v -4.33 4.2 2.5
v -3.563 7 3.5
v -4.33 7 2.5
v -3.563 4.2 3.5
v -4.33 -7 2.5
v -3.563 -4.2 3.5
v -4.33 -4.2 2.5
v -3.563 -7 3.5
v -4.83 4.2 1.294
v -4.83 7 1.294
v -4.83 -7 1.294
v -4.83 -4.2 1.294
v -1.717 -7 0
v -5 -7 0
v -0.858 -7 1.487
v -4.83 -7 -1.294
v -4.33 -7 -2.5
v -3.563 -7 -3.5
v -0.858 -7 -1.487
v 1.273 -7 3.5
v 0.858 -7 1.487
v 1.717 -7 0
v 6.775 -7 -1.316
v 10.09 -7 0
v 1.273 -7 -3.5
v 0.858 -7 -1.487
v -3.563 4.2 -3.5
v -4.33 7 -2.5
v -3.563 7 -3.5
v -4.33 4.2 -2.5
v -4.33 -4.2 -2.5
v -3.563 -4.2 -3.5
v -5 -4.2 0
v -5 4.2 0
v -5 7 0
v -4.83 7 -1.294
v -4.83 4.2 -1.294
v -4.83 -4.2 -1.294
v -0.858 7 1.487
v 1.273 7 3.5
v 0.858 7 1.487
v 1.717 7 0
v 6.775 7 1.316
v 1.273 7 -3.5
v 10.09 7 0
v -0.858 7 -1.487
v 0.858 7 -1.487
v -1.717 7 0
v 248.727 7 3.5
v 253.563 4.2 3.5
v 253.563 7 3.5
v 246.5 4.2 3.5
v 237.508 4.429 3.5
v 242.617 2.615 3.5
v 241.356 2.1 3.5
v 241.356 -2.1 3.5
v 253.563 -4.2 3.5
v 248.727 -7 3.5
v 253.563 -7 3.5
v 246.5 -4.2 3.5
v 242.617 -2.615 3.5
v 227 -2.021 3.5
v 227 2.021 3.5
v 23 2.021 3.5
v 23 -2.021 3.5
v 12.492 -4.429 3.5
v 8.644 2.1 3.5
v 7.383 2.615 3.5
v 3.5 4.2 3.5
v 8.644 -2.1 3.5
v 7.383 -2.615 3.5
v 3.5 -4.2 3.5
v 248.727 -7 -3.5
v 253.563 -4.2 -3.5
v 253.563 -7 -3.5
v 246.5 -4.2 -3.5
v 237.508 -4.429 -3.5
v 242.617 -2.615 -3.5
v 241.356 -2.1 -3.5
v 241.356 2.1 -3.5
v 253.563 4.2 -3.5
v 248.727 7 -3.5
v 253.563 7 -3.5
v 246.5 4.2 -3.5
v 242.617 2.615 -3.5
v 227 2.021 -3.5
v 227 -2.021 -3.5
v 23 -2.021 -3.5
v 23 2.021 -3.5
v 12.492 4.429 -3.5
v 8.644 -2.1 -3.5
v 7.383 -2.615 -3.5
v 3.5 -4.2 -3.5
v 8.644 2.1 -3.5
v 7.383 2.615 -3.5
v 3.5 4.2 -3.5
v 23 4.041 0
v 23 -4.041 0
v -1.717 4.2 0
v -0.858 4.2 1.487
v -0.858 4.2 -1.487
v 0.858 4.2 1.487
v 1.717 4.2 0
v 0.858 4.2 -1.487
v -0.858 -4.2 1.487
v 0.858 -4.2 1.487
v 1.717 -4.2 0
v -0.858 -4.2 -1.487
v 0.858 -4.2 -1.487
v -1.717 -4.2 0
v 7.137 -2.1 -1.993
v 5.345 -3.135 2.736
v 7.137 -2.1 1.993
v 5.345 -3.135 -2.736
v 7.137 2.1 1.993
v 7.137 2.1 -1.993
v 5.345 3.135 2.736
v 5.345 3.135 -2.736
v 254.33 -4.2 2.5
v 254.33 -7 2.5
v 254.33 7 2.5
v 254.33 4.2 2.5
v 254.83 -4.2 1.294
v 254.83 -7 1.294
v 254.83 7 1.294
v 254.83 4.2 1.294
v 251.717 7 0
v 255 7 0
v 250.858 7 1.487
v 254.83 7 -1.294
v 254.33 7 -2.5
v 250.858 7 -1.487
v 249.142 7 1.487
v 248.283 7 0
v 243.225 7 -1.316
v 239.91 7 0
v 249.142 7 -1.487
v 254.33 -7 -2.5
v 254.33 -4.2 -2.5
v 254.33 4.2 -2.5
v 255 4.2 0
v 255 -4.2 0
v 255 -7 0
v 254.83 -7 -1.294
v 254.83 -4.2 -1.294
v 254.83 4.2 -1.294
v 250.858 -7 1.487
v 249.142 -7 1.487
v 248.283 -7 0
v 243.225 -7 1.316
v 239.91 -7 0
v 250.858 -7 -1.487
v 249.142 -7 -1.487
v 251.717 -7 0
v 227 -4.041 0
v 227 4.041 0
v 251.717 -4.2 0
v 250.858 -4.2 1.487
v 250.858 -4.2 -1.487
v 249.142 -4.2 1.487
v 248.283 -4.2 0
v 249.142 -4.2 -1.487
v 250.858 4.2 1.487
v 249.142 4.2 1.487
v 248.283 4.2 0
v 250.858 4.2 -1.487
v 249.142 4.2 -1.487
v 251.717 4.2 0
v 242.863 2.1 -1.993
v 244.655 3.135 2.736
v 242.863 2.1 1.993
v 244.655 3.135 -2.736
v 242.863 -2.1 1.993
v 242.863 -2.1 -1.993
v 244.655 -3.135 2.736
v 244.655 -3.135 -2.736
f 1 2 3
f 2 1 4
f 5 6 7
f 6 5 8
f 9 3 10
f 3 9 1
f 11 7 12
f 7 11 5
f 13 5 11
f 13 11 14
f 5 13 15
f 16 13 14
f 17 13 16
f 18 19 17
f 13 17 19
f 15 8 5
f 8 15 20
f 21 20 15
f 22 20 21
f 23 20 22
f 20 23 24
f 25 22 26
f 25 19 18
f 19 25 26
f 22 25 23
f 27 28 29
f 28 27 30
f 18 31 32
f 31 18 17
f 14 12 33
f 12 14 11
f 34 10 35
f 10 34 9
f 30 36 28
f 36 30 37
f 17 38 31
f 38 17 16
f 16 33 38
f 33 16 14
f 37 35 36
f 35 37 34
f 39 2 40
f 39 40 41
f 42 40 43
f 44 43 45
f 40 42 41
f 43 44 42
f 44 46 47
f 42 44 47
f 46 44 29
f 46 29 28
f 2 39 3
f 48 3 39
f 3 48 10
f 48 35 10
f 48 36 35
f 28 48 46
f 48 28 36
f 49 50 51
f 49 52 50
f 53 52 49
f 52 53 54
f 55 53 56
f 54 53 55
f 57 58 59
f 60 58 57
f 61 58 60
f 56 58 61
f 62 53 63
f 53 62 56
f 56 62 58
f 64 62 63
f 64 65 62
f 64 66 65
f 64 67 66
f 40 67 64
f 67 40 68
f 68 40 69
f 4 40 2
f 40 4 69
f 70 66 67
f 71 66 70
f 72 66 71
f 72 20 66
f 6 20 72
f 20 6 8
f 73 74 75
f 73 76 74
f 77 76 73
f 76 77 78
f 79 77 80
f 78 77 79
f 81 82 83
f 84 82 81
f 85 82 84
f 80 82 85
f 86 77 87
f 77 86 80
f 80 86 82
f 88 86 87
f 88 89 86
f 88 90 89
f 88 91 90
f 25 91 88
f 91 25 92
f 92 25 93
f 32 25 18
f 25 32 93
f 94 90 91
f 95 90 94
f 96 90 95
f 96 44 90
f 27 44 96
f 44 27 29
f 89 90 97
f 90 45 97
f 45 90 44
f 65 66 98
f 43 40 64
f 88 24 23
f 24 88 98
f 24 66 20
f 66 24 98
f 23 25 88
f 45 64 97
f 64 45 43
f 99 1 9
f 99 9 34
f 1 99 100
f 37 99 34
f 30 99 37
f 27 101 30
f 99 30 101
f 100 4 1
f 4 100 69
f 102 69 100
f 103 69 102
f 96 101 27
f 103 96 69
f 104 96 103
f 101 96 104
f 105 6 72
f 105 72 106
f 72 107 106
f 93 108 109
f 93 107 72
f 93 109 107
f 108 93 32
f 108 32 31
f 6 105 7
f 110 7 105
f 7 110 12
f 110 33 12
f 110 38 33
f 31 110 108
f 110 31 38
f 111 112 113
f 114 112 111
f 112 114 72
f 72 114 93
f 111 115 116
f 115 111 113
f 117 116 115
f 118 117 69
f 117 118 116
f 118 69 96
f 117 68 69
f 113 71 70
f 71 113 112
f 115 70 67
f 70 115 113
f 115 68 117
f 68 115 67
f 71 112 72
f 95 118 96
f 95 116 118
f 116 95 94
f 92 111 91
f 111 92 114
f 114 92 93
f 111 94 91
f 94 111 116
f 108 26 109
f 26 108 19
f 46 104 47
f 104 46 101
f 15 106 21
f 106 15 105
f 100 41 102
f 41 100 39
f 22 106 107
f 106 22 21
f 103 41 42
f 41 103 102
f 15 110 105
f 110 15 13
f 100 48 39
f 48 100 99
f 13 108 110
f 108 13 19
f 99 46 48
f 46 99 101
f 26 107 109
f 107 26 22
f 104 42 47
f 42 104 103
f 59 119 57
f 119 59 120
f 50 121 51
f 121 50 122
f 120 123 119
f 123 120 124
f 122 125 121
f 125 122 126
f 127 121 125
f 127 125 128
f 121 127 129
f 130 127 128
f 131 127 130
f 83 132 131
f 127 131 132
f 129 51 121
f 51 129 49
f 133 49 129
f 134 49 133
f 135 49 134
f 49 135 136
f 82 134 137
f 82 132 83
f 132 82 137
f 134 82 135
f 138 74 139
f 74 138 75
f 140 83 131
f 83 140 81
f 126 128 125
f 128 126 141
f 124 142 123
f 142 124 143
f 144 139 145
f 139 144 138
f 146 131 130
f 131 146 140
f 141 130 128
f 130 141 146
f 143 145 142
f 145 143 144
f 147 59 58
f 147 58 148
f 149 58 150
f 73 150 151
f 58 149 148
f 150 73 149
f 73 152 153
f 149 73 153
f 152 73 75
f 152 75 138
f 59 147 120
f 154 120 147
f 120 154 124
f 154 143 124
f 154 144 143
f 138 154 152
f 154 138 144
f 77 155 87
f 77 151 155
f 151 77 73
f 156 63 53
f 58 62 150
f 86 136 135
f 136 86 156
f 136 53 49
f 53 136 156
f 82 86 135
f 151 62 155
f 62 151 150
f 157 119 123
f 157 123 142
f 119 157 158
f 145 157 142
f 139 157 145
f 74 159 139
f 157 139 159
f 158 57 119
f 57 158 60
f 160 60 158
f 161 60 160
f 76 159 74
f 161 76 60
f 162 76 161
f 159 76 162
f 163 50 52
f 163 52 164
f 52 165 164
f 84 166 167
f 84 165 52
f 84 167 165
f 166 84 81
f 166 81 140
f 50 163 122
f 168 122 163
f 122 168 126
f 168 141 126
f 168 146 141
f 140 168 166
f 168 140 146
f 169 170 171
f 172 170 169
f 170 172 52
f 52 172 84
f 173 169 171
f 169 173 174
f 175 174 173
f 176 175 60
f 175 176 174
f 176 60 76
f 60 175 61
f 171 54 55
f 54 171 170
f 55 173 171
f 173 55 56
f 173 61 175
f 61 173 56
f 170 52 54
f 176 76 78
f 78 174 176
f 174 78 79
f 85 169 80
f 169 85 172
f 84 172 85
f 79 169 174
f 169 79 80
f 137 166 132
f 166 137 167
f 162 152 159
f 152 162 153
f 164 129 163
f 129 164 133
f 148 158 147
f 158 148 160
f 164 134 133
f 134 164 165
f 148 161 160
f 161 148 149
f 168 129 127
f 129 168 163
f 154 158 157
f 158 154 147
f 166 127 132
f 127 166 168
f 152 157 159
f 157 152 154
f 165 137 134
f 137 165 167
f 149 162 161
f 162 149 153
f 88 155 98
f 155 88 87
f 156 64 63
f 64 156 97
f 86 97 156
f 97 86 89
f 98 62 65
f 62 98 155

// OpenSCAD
// file: polyholes.scad
//
// Mendel90
//
// GNU GPL v2
// nop.head@gmail.com
// hydraraptor.blogspot.com
//
// See http://hydraraptor.blogspot.com/2011/02/polyholes.html
//
function sides(r) = max(round(4 *r),3);
function corrected_radius(r,n) = 0.1 + r / cos(180 / n);
function corrected_diameter(d) = 0.2 + d / cos(180 / sides(d / 2));

module poly_circle(r, center = false) {
    n = sides(r);
    circle(r = corrected_radius(r,n), $fn = n, center = center);
}

module poly_cylinder(r, h, center = false) {
    n = sides(r);
    cylinder(h = h, r = corrected_radius(r,n), $fn = n, center = center);
}

module poly_d_cylinder(r, center = false) {
    n = sides(r);
    r = corrected_radius(r,n);
    cylinder(h = h, r = r, $fn = n, center = center);
    translate([0, -r, 0])
        cube([r, 2 * r, h]);
}
// file: jaws.scad
use <polyholes.scad>
h = 7;
r = h/2 / cos(30);

module jaws() {
  difference() {
    union() {
      intersection () {
        rotate([90, 0, 0]) cylinder(r=5, h=14, center=true, $fn=24);
        translate([-4, 0, 0]) cube([10, 14, h], center=true);
      }
      intersection() {
        translate([10, 0, 0]) cube([26, 14, h], center=true);
        translate([10, 0, 0]) rotate([0, 90, 0]) rotate([0, 0, 30])
          cylinder(r1=10, r2=r, h=26, center=true, $fn=6);
      }
    }
    translate([-1.5, 0, 0]) cube([10, 8.4, 10], center=true);
    translate([3.5, 0, 0]) rotate([0, 0, 30])
      cylinder(r=4.2, h=10, center=true, $fn=6);
    translate([4, 0, 4]) rotate([0, 45, 0])
      rotate([0, 0, 30]) cylinder(r=4.2, h=8, center=true, $fn=6);
    translate([4, 0, -4]) rotate([0, -45, 0])
      rotate([0, 0, 30]) cylinder(r=4.2, h=8, center=true, $fn=6);
    rotate([90, 0, 0]) poly_cylinder(r=1.4, h=40, center=true, $fn=12);
    translate([19, 0, 0]) rotate([0, 90, 0])
      cylinder(r=2.8, h=20, center=true, $fn=12);
  }
}

translate([0, 0, h/2]) jaws();
// file: configuration.scad
// Bearing dimensions: ID, OD, W
bearing623 = [3, 10, 4];
bearing624 = [4, 13, 5];
bearing608 = [8, 22, 7];
bearinglm8uu = [8, 15, 25];
bearinglm10uu = [10, 19, 29];

smooth_rod_separation = 60;
//smooth_rod_length = 300; // Rostock mini
//smooth_rod_radius = 4;
//smooth_rod_bearing = bearinglm8uu;
smooth_rod_length = 770;
smooth_rod_radius = 5;
smooth_rod_bearing = bearinglm10uu;

motor_end_height = 44;

idler_end_height = 28;
//idler_bearing = bearing608;  // For 20 tooth GT2
idler_bearing = bearing624;  // For 16 thooth GT2

platform_thickness = 8;
platform_hinge_offset = 33;

bed_thickness = 12;
pcb_thickness = 2;

rod_separation = 50;
//rod_length = 150; // Rostock mini
//rod_radius = 65; // Rostock mini
rod_length = 250;
rod_radius = 124;

// These are needed by modules in a couple of different files
carriage_height = smooth_rod_bearing[2];
carriage_hinge_offset = smooth_rod_bearing[1]/2+14.5;

bottom_endstops = false; // If true, adds extra mount points to the platform
ball_joints = true;
ball_rad = 9.5 / 2 + 0.2; // Add a little extra radius for glue
cup_rad = ball_rad + 1;
cup_offset = cup_rad-platform_thickness/2;
// main file
include <configuration.scad>
use <jaws.scad>

l = rod_length;
h = 7;
r = h/2 / cos(30);

// Wipe nozzle after long travel moves.
module collar() {
  difference() {
    cube([4, 20, h], center=true);
    cube([2, 18, h+1], center=true);
    rotate([0, 90, 0]) rotate([0, 0, 30])
      cylinder(r=5, h=5, center=true, $fn=6);
  }
}

// Small hollow cube.
module cubicle() {
  difference() {
    cube([6, 6, h], center=true);
    cube([4, 4, h+1], center=true);
  }
}

// Nozzle wipers.
module wipers() {
  translate([l/2+2, 0, 0]) cubicle();
  translate([-l/2-2, 0, 0]) cubicle();
  translate([l/2-25, 0, 0]) collar();
  translate([-l/2+25, 0, 0]) collar();
}

// Rod with two Y shaped rod ends.
module rod(l) {
  translate([l/2,0,0])
  union() {
    translate([-l/2, 0, 0]) jaws();
    translate([l/2, 0, 0]) rotate([0, 0, 180]) jaws();
    rotate([0, 90, 0]) rotate([0, 0, 30])
      cylinder(r=r, h=l-18, center=true, $fn=6);
  }
}

// Rod with two Y shaped rod ends.
module ball_rod(l) {
  translate([l/2,0,0])
  union() {
    translate([-l/2, 0, 0]) sphere(r=ball_rad);
    translate([l/2, 0, 0]) rotate([0, 0, 180]) sphere(r=ball_rad);
    rotate([0, 90, 0]) rotate([0, 0, 30])
      cylinder(r=r, h=l, center=true, $fn=6);
  }
}

module printable_rod(l)
{
	// Print platform.
	bed = 8*25.4; // 8x8 inches.
	% translate([0, 0, -1]) cube([bed, bed, 2], center=true);

	rotate(45)
	translate([-l/2,0,h/2])
	rod(l=l);

	// If your nozzle doesn't ooze at all, you can comment the next line out.
	translate([0,0,h/2])
	rotate(45)
	wipers();
}

rod(l=l);
//printable_rod(l=l);
